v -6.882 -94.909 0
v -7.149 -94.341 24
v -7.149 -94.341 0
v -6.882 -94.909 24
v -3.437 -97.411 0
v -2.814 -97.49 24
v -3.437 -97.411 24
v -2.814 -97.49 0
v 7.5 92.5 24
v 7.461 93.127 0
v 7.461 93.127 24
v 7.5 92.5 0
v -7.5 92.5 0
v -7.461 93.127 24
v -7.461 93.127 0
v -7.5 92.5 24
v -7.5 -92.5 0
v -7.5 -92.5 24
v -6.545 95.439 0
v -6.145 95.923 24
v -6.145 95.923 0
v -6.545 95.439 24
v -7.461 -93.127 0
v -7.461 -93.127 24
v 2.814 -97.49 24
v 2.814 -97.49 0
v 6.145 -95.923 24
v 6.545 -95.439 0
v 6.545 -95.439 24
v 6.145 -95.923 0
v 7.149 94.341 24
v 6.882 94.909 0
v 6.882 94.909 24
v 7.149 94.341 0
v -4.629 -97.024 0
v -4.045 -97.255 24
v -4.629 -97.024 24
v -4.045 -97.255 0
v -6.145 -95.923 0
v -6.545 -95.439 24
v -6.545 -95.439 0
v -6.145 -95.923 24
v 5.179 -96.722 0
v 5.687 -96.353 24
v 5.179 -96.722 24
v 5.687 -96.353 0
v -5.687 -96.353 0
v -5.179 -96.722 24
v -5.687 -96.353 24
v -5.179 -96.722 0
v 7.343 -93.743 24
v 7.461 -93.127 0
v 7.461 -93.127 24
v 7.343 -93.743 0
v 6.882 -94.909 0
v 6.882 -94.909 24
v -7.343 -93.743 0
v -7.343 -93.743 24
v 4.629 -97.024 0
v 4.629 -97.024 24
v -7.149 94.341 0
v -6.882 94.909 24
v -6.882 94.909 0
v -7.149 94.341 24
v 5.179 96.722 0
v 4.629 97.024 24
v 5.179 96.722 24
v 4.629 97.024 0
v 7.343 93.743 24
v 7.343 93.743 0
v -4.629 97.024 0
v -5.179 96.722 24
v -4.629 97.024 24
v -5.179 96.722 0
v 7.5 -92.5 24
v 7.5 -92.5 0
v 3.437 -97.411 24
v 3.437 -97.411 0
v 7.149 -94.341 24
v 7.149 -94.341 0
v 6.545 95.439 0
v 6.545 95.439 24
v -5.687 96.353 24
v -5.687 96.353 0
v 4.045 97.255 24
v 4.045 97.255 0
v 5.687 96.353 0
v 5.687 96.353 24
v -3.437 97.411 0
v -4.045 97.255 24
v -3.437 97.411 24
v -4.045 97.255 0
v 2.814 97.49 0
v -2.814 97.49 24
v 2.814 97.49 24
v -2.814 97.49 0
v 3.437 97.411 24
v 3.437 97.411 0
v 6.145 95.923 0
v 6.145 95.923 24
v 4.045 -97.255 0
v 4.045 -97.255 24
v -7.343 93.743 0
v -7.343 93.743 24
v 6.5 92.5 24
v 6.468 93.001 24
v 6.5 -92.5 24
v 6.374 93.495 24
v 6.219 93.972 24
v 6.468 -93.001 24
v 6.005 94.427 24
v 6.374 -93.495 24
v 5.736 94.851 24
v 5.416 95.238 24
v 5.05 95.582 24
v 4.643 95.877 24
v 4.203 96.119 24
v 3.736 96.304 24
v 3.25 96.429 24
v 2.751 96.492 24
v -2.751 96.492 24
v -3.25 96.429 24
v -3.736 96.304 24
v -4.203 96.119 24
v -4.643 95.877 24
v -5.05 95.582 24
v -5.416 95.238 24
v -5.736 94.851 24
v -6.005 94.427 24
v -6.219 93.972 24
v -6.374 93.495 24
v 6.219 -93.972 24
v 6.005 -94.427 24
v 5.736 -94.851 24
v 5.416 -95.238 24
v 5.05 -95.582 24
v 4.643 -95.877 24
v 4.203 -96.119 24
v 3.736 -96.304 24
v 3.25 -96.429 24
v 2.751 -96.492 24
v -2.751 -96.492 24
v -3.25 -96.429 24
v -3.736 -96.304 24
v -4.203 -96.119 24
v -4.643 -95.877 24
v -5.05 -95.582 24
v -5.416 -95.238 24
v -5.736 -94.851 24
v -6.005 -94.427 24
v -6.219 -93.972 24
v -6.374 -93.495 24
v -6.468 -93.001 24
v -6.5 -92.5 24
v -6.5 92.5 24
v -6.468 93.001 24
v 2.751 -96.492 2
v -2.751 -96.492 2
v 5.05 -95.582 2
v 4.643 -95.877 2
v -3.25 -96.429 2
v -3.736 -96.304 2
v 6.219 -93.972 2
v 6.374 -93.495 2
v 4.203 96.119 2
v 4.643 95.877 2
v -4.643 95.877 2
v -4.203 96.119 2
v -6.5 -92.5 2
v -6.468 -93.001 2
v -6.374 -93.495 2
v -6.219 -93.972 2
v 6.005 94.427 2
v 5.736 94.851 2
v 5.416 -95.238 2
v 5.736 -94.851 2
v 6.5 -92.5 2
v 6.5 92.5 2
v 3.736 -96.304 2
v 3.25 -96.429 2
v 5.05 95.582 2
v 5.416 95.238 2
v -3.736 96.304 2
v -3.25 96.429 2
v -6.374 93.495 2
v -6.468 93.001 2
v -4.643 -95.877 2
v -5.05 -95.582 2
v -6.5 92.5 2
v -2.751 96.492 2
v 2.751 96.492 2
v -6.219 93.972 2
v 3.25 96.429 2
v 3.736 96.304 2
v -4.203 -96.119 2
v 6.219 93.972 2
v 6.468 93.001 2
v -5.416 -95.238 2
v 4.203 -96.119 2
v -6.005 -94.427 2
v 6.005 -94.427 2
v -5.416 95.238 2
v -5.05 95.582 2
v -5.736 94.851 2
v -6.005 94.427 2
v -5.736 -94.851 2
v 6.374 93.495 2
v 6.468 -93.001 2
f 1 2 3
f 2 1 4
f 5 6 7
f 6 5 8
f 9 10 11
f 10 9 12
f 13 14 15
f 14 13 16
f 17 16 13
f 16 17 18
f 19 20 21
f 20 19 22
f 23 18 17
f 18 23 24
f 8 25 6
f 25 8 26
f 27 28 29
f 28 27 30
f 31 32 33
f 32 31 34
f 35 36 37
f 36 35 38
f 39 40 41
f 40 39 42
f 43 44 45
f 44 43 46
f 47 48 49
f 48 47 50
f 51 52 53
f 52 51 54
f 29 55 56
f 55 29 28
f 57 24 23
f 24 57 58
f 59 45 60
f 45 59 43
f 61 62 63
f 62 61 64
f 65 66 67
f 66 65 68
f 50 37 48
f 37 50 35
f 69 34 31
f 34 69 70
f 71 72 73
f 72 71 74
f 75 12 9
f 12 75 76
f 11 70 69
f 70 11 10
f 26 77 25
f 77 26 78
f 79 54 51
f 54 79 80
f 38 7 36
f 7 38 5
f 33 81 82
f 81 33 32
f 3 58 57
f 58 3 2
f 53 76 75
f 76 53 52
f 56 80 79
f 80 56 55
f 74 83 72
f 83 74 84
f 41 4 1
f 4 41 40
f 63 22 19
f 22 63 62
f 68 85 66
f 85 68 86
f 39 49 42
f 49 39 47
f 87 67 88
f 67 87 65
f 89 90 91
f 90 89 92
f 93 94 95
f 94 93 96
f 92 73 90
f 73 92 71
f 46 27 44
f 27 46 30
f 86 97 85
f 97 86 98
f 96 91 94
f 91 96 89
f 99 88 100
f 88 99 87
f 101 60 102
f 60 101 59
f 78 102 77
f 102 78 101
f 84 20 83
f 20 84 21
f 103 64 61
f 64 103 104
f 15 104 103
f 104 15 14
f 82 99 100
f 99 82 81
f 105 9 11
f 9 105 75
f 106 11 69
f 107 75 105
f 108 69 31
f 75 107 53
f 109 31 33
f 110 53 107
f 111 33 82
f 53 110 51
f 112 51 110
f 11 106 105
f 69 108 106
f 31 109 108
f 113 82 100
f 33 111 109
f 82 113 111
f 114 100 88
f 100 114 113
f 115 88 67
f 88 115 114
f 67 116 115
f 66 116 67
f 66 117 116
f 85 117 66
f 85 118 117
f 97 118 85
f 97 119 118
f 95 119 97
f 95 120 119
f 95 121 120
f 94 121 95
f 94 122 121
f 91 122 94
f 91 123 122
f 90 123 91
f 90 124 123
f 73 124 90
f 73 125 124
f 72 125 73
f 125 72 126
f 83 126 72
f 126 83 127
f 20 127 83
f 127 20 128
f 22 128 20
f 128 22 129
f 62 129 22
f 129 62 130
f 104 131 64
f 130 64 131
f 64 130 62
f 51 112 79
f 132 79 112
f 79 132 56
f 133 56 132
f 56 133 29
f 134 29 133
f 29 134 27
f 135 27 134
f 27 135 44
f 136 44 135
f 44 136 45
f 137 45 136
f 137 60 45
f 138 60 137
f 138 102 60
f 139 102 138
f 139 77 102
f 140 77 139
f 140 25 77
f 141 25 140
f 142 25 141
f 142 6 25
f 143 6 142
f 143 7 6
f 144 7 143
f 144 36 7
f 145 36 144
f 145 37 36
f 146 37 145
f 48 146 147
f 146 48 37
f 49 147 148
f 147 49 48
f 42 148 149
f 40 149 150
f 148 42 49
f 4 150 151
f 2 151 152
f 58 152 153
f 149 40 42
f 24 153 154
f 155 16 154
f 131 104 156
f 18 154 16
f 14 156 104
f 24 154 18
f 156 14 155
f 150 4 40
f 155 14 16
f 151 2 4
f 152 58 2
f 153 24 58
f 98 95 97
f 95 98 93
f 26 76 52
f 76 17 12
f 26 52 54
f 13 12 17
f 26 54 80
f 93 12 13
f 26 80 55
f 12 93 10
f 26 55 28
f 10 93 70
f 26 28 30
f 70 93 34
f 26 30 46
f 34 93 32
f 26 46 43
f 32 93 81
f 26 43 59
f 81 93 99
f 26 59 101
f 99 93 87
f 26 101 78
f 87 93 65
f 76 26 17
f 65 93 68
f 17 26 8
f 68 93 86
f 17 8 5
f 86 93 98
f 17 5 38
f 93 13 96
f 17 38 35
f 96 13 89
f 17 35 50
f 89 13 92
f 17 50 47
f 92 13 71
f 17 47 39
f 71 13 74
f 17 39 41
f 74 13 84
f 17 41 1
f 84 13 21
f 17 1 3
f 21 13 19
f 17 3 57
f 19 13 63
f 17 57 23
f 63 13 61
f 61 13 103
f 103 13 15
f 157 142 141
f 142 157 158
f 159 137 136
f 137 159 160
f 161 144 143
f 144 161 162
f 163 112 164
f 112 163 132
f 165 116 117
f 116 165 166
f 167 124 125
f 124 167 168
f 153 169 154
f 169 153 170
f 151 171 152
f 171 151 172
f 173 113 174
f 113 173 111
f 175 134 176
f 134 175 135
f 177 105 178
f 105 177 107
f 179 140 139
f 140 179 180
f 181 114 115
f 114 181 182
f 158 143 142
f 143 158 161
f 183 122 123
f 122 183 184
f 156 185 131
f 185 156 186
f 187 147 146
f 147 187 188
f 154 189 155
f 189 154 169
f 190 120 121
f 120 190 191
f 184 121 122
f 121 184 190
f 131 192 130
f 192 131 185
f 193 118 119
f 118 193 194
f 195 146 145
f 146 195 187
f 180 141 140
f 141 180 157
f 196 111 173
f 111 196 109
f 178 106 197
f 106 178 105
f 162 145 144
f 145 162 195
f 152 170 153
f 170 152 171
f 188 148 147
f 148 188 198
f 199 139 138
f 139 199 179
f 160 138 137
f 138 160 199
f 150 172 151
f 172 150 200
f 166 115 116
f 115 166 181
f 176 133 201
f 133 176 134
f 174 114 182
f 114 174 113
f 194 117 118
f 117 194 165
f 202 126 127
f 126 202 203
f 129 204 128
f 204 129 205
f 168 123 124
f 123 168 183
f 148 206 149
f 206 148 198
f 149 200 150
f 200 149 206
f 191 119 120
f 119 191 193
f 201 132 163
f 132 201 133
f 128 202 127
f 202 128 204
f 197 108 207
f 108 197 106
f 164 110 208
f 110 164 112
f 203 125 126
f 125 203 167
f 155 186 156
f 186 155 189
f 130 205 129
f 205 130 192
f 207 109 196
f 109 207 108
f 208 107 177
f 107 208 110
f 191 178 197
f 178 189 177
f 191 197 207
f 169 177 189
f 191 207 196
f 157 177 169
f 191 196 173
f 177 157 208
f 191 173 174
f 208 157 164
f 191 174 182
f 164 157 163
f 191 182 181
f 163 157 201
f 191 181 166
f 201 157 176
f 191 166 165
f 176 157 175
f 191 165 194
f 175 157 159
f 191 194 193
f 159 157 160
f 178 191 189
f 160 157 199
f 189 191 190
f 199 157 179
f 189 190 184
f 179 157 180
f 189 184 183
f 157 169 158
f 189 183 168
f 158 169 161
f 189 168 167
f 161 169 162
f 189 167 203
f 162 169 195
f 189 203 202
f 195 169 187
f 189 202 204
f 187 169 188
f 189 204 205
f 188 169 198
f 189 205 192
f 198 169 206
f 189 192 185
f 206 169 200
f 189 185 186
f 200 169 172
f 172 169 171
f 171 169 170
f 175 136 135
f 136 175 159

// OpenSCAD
$fn = 50;


difference() {
	union() {
		hull() {
			translate(v = [-2.5000000000, 92.5000000000, 0]) {
				cylinder(h = 24, r = 5);
			}
			translate(v = [2.5000000000, 92.5000000000, 0]) {
				cylinder(h = 24, r = 5);
			}
			translate(v = [-2.5000000000, -92.5000000000, 0]) {
				cylinder(h = 24, r = 5);
			}
			translate(v = [2.5000000000, -92.5000000000, 0]) {
				cylinder(h = 24, r = 5);
			}
		}
	}
	union() {
		translate(v = [0, 0, 2]) {
			hull() {
				translate(v = [-2.5000000000, 92.5000000000, 0]) {
					cylinder(h = 22, r = 4);
				}
				translate(v = [2.5000000000, 92.5000000000, 0]) {
					cylinder(h = 22, r = 4);
				}
				translate(v = [-2.5000000000, -92.5000000000, 0]) {
					cylinder(h = 22, r = 4);
				}
				translate(v = [2.5000000000, -92.5000000000, 0]) {
					cylinder(h = 22, r = 4);
				}
			}
		}
	}
}
